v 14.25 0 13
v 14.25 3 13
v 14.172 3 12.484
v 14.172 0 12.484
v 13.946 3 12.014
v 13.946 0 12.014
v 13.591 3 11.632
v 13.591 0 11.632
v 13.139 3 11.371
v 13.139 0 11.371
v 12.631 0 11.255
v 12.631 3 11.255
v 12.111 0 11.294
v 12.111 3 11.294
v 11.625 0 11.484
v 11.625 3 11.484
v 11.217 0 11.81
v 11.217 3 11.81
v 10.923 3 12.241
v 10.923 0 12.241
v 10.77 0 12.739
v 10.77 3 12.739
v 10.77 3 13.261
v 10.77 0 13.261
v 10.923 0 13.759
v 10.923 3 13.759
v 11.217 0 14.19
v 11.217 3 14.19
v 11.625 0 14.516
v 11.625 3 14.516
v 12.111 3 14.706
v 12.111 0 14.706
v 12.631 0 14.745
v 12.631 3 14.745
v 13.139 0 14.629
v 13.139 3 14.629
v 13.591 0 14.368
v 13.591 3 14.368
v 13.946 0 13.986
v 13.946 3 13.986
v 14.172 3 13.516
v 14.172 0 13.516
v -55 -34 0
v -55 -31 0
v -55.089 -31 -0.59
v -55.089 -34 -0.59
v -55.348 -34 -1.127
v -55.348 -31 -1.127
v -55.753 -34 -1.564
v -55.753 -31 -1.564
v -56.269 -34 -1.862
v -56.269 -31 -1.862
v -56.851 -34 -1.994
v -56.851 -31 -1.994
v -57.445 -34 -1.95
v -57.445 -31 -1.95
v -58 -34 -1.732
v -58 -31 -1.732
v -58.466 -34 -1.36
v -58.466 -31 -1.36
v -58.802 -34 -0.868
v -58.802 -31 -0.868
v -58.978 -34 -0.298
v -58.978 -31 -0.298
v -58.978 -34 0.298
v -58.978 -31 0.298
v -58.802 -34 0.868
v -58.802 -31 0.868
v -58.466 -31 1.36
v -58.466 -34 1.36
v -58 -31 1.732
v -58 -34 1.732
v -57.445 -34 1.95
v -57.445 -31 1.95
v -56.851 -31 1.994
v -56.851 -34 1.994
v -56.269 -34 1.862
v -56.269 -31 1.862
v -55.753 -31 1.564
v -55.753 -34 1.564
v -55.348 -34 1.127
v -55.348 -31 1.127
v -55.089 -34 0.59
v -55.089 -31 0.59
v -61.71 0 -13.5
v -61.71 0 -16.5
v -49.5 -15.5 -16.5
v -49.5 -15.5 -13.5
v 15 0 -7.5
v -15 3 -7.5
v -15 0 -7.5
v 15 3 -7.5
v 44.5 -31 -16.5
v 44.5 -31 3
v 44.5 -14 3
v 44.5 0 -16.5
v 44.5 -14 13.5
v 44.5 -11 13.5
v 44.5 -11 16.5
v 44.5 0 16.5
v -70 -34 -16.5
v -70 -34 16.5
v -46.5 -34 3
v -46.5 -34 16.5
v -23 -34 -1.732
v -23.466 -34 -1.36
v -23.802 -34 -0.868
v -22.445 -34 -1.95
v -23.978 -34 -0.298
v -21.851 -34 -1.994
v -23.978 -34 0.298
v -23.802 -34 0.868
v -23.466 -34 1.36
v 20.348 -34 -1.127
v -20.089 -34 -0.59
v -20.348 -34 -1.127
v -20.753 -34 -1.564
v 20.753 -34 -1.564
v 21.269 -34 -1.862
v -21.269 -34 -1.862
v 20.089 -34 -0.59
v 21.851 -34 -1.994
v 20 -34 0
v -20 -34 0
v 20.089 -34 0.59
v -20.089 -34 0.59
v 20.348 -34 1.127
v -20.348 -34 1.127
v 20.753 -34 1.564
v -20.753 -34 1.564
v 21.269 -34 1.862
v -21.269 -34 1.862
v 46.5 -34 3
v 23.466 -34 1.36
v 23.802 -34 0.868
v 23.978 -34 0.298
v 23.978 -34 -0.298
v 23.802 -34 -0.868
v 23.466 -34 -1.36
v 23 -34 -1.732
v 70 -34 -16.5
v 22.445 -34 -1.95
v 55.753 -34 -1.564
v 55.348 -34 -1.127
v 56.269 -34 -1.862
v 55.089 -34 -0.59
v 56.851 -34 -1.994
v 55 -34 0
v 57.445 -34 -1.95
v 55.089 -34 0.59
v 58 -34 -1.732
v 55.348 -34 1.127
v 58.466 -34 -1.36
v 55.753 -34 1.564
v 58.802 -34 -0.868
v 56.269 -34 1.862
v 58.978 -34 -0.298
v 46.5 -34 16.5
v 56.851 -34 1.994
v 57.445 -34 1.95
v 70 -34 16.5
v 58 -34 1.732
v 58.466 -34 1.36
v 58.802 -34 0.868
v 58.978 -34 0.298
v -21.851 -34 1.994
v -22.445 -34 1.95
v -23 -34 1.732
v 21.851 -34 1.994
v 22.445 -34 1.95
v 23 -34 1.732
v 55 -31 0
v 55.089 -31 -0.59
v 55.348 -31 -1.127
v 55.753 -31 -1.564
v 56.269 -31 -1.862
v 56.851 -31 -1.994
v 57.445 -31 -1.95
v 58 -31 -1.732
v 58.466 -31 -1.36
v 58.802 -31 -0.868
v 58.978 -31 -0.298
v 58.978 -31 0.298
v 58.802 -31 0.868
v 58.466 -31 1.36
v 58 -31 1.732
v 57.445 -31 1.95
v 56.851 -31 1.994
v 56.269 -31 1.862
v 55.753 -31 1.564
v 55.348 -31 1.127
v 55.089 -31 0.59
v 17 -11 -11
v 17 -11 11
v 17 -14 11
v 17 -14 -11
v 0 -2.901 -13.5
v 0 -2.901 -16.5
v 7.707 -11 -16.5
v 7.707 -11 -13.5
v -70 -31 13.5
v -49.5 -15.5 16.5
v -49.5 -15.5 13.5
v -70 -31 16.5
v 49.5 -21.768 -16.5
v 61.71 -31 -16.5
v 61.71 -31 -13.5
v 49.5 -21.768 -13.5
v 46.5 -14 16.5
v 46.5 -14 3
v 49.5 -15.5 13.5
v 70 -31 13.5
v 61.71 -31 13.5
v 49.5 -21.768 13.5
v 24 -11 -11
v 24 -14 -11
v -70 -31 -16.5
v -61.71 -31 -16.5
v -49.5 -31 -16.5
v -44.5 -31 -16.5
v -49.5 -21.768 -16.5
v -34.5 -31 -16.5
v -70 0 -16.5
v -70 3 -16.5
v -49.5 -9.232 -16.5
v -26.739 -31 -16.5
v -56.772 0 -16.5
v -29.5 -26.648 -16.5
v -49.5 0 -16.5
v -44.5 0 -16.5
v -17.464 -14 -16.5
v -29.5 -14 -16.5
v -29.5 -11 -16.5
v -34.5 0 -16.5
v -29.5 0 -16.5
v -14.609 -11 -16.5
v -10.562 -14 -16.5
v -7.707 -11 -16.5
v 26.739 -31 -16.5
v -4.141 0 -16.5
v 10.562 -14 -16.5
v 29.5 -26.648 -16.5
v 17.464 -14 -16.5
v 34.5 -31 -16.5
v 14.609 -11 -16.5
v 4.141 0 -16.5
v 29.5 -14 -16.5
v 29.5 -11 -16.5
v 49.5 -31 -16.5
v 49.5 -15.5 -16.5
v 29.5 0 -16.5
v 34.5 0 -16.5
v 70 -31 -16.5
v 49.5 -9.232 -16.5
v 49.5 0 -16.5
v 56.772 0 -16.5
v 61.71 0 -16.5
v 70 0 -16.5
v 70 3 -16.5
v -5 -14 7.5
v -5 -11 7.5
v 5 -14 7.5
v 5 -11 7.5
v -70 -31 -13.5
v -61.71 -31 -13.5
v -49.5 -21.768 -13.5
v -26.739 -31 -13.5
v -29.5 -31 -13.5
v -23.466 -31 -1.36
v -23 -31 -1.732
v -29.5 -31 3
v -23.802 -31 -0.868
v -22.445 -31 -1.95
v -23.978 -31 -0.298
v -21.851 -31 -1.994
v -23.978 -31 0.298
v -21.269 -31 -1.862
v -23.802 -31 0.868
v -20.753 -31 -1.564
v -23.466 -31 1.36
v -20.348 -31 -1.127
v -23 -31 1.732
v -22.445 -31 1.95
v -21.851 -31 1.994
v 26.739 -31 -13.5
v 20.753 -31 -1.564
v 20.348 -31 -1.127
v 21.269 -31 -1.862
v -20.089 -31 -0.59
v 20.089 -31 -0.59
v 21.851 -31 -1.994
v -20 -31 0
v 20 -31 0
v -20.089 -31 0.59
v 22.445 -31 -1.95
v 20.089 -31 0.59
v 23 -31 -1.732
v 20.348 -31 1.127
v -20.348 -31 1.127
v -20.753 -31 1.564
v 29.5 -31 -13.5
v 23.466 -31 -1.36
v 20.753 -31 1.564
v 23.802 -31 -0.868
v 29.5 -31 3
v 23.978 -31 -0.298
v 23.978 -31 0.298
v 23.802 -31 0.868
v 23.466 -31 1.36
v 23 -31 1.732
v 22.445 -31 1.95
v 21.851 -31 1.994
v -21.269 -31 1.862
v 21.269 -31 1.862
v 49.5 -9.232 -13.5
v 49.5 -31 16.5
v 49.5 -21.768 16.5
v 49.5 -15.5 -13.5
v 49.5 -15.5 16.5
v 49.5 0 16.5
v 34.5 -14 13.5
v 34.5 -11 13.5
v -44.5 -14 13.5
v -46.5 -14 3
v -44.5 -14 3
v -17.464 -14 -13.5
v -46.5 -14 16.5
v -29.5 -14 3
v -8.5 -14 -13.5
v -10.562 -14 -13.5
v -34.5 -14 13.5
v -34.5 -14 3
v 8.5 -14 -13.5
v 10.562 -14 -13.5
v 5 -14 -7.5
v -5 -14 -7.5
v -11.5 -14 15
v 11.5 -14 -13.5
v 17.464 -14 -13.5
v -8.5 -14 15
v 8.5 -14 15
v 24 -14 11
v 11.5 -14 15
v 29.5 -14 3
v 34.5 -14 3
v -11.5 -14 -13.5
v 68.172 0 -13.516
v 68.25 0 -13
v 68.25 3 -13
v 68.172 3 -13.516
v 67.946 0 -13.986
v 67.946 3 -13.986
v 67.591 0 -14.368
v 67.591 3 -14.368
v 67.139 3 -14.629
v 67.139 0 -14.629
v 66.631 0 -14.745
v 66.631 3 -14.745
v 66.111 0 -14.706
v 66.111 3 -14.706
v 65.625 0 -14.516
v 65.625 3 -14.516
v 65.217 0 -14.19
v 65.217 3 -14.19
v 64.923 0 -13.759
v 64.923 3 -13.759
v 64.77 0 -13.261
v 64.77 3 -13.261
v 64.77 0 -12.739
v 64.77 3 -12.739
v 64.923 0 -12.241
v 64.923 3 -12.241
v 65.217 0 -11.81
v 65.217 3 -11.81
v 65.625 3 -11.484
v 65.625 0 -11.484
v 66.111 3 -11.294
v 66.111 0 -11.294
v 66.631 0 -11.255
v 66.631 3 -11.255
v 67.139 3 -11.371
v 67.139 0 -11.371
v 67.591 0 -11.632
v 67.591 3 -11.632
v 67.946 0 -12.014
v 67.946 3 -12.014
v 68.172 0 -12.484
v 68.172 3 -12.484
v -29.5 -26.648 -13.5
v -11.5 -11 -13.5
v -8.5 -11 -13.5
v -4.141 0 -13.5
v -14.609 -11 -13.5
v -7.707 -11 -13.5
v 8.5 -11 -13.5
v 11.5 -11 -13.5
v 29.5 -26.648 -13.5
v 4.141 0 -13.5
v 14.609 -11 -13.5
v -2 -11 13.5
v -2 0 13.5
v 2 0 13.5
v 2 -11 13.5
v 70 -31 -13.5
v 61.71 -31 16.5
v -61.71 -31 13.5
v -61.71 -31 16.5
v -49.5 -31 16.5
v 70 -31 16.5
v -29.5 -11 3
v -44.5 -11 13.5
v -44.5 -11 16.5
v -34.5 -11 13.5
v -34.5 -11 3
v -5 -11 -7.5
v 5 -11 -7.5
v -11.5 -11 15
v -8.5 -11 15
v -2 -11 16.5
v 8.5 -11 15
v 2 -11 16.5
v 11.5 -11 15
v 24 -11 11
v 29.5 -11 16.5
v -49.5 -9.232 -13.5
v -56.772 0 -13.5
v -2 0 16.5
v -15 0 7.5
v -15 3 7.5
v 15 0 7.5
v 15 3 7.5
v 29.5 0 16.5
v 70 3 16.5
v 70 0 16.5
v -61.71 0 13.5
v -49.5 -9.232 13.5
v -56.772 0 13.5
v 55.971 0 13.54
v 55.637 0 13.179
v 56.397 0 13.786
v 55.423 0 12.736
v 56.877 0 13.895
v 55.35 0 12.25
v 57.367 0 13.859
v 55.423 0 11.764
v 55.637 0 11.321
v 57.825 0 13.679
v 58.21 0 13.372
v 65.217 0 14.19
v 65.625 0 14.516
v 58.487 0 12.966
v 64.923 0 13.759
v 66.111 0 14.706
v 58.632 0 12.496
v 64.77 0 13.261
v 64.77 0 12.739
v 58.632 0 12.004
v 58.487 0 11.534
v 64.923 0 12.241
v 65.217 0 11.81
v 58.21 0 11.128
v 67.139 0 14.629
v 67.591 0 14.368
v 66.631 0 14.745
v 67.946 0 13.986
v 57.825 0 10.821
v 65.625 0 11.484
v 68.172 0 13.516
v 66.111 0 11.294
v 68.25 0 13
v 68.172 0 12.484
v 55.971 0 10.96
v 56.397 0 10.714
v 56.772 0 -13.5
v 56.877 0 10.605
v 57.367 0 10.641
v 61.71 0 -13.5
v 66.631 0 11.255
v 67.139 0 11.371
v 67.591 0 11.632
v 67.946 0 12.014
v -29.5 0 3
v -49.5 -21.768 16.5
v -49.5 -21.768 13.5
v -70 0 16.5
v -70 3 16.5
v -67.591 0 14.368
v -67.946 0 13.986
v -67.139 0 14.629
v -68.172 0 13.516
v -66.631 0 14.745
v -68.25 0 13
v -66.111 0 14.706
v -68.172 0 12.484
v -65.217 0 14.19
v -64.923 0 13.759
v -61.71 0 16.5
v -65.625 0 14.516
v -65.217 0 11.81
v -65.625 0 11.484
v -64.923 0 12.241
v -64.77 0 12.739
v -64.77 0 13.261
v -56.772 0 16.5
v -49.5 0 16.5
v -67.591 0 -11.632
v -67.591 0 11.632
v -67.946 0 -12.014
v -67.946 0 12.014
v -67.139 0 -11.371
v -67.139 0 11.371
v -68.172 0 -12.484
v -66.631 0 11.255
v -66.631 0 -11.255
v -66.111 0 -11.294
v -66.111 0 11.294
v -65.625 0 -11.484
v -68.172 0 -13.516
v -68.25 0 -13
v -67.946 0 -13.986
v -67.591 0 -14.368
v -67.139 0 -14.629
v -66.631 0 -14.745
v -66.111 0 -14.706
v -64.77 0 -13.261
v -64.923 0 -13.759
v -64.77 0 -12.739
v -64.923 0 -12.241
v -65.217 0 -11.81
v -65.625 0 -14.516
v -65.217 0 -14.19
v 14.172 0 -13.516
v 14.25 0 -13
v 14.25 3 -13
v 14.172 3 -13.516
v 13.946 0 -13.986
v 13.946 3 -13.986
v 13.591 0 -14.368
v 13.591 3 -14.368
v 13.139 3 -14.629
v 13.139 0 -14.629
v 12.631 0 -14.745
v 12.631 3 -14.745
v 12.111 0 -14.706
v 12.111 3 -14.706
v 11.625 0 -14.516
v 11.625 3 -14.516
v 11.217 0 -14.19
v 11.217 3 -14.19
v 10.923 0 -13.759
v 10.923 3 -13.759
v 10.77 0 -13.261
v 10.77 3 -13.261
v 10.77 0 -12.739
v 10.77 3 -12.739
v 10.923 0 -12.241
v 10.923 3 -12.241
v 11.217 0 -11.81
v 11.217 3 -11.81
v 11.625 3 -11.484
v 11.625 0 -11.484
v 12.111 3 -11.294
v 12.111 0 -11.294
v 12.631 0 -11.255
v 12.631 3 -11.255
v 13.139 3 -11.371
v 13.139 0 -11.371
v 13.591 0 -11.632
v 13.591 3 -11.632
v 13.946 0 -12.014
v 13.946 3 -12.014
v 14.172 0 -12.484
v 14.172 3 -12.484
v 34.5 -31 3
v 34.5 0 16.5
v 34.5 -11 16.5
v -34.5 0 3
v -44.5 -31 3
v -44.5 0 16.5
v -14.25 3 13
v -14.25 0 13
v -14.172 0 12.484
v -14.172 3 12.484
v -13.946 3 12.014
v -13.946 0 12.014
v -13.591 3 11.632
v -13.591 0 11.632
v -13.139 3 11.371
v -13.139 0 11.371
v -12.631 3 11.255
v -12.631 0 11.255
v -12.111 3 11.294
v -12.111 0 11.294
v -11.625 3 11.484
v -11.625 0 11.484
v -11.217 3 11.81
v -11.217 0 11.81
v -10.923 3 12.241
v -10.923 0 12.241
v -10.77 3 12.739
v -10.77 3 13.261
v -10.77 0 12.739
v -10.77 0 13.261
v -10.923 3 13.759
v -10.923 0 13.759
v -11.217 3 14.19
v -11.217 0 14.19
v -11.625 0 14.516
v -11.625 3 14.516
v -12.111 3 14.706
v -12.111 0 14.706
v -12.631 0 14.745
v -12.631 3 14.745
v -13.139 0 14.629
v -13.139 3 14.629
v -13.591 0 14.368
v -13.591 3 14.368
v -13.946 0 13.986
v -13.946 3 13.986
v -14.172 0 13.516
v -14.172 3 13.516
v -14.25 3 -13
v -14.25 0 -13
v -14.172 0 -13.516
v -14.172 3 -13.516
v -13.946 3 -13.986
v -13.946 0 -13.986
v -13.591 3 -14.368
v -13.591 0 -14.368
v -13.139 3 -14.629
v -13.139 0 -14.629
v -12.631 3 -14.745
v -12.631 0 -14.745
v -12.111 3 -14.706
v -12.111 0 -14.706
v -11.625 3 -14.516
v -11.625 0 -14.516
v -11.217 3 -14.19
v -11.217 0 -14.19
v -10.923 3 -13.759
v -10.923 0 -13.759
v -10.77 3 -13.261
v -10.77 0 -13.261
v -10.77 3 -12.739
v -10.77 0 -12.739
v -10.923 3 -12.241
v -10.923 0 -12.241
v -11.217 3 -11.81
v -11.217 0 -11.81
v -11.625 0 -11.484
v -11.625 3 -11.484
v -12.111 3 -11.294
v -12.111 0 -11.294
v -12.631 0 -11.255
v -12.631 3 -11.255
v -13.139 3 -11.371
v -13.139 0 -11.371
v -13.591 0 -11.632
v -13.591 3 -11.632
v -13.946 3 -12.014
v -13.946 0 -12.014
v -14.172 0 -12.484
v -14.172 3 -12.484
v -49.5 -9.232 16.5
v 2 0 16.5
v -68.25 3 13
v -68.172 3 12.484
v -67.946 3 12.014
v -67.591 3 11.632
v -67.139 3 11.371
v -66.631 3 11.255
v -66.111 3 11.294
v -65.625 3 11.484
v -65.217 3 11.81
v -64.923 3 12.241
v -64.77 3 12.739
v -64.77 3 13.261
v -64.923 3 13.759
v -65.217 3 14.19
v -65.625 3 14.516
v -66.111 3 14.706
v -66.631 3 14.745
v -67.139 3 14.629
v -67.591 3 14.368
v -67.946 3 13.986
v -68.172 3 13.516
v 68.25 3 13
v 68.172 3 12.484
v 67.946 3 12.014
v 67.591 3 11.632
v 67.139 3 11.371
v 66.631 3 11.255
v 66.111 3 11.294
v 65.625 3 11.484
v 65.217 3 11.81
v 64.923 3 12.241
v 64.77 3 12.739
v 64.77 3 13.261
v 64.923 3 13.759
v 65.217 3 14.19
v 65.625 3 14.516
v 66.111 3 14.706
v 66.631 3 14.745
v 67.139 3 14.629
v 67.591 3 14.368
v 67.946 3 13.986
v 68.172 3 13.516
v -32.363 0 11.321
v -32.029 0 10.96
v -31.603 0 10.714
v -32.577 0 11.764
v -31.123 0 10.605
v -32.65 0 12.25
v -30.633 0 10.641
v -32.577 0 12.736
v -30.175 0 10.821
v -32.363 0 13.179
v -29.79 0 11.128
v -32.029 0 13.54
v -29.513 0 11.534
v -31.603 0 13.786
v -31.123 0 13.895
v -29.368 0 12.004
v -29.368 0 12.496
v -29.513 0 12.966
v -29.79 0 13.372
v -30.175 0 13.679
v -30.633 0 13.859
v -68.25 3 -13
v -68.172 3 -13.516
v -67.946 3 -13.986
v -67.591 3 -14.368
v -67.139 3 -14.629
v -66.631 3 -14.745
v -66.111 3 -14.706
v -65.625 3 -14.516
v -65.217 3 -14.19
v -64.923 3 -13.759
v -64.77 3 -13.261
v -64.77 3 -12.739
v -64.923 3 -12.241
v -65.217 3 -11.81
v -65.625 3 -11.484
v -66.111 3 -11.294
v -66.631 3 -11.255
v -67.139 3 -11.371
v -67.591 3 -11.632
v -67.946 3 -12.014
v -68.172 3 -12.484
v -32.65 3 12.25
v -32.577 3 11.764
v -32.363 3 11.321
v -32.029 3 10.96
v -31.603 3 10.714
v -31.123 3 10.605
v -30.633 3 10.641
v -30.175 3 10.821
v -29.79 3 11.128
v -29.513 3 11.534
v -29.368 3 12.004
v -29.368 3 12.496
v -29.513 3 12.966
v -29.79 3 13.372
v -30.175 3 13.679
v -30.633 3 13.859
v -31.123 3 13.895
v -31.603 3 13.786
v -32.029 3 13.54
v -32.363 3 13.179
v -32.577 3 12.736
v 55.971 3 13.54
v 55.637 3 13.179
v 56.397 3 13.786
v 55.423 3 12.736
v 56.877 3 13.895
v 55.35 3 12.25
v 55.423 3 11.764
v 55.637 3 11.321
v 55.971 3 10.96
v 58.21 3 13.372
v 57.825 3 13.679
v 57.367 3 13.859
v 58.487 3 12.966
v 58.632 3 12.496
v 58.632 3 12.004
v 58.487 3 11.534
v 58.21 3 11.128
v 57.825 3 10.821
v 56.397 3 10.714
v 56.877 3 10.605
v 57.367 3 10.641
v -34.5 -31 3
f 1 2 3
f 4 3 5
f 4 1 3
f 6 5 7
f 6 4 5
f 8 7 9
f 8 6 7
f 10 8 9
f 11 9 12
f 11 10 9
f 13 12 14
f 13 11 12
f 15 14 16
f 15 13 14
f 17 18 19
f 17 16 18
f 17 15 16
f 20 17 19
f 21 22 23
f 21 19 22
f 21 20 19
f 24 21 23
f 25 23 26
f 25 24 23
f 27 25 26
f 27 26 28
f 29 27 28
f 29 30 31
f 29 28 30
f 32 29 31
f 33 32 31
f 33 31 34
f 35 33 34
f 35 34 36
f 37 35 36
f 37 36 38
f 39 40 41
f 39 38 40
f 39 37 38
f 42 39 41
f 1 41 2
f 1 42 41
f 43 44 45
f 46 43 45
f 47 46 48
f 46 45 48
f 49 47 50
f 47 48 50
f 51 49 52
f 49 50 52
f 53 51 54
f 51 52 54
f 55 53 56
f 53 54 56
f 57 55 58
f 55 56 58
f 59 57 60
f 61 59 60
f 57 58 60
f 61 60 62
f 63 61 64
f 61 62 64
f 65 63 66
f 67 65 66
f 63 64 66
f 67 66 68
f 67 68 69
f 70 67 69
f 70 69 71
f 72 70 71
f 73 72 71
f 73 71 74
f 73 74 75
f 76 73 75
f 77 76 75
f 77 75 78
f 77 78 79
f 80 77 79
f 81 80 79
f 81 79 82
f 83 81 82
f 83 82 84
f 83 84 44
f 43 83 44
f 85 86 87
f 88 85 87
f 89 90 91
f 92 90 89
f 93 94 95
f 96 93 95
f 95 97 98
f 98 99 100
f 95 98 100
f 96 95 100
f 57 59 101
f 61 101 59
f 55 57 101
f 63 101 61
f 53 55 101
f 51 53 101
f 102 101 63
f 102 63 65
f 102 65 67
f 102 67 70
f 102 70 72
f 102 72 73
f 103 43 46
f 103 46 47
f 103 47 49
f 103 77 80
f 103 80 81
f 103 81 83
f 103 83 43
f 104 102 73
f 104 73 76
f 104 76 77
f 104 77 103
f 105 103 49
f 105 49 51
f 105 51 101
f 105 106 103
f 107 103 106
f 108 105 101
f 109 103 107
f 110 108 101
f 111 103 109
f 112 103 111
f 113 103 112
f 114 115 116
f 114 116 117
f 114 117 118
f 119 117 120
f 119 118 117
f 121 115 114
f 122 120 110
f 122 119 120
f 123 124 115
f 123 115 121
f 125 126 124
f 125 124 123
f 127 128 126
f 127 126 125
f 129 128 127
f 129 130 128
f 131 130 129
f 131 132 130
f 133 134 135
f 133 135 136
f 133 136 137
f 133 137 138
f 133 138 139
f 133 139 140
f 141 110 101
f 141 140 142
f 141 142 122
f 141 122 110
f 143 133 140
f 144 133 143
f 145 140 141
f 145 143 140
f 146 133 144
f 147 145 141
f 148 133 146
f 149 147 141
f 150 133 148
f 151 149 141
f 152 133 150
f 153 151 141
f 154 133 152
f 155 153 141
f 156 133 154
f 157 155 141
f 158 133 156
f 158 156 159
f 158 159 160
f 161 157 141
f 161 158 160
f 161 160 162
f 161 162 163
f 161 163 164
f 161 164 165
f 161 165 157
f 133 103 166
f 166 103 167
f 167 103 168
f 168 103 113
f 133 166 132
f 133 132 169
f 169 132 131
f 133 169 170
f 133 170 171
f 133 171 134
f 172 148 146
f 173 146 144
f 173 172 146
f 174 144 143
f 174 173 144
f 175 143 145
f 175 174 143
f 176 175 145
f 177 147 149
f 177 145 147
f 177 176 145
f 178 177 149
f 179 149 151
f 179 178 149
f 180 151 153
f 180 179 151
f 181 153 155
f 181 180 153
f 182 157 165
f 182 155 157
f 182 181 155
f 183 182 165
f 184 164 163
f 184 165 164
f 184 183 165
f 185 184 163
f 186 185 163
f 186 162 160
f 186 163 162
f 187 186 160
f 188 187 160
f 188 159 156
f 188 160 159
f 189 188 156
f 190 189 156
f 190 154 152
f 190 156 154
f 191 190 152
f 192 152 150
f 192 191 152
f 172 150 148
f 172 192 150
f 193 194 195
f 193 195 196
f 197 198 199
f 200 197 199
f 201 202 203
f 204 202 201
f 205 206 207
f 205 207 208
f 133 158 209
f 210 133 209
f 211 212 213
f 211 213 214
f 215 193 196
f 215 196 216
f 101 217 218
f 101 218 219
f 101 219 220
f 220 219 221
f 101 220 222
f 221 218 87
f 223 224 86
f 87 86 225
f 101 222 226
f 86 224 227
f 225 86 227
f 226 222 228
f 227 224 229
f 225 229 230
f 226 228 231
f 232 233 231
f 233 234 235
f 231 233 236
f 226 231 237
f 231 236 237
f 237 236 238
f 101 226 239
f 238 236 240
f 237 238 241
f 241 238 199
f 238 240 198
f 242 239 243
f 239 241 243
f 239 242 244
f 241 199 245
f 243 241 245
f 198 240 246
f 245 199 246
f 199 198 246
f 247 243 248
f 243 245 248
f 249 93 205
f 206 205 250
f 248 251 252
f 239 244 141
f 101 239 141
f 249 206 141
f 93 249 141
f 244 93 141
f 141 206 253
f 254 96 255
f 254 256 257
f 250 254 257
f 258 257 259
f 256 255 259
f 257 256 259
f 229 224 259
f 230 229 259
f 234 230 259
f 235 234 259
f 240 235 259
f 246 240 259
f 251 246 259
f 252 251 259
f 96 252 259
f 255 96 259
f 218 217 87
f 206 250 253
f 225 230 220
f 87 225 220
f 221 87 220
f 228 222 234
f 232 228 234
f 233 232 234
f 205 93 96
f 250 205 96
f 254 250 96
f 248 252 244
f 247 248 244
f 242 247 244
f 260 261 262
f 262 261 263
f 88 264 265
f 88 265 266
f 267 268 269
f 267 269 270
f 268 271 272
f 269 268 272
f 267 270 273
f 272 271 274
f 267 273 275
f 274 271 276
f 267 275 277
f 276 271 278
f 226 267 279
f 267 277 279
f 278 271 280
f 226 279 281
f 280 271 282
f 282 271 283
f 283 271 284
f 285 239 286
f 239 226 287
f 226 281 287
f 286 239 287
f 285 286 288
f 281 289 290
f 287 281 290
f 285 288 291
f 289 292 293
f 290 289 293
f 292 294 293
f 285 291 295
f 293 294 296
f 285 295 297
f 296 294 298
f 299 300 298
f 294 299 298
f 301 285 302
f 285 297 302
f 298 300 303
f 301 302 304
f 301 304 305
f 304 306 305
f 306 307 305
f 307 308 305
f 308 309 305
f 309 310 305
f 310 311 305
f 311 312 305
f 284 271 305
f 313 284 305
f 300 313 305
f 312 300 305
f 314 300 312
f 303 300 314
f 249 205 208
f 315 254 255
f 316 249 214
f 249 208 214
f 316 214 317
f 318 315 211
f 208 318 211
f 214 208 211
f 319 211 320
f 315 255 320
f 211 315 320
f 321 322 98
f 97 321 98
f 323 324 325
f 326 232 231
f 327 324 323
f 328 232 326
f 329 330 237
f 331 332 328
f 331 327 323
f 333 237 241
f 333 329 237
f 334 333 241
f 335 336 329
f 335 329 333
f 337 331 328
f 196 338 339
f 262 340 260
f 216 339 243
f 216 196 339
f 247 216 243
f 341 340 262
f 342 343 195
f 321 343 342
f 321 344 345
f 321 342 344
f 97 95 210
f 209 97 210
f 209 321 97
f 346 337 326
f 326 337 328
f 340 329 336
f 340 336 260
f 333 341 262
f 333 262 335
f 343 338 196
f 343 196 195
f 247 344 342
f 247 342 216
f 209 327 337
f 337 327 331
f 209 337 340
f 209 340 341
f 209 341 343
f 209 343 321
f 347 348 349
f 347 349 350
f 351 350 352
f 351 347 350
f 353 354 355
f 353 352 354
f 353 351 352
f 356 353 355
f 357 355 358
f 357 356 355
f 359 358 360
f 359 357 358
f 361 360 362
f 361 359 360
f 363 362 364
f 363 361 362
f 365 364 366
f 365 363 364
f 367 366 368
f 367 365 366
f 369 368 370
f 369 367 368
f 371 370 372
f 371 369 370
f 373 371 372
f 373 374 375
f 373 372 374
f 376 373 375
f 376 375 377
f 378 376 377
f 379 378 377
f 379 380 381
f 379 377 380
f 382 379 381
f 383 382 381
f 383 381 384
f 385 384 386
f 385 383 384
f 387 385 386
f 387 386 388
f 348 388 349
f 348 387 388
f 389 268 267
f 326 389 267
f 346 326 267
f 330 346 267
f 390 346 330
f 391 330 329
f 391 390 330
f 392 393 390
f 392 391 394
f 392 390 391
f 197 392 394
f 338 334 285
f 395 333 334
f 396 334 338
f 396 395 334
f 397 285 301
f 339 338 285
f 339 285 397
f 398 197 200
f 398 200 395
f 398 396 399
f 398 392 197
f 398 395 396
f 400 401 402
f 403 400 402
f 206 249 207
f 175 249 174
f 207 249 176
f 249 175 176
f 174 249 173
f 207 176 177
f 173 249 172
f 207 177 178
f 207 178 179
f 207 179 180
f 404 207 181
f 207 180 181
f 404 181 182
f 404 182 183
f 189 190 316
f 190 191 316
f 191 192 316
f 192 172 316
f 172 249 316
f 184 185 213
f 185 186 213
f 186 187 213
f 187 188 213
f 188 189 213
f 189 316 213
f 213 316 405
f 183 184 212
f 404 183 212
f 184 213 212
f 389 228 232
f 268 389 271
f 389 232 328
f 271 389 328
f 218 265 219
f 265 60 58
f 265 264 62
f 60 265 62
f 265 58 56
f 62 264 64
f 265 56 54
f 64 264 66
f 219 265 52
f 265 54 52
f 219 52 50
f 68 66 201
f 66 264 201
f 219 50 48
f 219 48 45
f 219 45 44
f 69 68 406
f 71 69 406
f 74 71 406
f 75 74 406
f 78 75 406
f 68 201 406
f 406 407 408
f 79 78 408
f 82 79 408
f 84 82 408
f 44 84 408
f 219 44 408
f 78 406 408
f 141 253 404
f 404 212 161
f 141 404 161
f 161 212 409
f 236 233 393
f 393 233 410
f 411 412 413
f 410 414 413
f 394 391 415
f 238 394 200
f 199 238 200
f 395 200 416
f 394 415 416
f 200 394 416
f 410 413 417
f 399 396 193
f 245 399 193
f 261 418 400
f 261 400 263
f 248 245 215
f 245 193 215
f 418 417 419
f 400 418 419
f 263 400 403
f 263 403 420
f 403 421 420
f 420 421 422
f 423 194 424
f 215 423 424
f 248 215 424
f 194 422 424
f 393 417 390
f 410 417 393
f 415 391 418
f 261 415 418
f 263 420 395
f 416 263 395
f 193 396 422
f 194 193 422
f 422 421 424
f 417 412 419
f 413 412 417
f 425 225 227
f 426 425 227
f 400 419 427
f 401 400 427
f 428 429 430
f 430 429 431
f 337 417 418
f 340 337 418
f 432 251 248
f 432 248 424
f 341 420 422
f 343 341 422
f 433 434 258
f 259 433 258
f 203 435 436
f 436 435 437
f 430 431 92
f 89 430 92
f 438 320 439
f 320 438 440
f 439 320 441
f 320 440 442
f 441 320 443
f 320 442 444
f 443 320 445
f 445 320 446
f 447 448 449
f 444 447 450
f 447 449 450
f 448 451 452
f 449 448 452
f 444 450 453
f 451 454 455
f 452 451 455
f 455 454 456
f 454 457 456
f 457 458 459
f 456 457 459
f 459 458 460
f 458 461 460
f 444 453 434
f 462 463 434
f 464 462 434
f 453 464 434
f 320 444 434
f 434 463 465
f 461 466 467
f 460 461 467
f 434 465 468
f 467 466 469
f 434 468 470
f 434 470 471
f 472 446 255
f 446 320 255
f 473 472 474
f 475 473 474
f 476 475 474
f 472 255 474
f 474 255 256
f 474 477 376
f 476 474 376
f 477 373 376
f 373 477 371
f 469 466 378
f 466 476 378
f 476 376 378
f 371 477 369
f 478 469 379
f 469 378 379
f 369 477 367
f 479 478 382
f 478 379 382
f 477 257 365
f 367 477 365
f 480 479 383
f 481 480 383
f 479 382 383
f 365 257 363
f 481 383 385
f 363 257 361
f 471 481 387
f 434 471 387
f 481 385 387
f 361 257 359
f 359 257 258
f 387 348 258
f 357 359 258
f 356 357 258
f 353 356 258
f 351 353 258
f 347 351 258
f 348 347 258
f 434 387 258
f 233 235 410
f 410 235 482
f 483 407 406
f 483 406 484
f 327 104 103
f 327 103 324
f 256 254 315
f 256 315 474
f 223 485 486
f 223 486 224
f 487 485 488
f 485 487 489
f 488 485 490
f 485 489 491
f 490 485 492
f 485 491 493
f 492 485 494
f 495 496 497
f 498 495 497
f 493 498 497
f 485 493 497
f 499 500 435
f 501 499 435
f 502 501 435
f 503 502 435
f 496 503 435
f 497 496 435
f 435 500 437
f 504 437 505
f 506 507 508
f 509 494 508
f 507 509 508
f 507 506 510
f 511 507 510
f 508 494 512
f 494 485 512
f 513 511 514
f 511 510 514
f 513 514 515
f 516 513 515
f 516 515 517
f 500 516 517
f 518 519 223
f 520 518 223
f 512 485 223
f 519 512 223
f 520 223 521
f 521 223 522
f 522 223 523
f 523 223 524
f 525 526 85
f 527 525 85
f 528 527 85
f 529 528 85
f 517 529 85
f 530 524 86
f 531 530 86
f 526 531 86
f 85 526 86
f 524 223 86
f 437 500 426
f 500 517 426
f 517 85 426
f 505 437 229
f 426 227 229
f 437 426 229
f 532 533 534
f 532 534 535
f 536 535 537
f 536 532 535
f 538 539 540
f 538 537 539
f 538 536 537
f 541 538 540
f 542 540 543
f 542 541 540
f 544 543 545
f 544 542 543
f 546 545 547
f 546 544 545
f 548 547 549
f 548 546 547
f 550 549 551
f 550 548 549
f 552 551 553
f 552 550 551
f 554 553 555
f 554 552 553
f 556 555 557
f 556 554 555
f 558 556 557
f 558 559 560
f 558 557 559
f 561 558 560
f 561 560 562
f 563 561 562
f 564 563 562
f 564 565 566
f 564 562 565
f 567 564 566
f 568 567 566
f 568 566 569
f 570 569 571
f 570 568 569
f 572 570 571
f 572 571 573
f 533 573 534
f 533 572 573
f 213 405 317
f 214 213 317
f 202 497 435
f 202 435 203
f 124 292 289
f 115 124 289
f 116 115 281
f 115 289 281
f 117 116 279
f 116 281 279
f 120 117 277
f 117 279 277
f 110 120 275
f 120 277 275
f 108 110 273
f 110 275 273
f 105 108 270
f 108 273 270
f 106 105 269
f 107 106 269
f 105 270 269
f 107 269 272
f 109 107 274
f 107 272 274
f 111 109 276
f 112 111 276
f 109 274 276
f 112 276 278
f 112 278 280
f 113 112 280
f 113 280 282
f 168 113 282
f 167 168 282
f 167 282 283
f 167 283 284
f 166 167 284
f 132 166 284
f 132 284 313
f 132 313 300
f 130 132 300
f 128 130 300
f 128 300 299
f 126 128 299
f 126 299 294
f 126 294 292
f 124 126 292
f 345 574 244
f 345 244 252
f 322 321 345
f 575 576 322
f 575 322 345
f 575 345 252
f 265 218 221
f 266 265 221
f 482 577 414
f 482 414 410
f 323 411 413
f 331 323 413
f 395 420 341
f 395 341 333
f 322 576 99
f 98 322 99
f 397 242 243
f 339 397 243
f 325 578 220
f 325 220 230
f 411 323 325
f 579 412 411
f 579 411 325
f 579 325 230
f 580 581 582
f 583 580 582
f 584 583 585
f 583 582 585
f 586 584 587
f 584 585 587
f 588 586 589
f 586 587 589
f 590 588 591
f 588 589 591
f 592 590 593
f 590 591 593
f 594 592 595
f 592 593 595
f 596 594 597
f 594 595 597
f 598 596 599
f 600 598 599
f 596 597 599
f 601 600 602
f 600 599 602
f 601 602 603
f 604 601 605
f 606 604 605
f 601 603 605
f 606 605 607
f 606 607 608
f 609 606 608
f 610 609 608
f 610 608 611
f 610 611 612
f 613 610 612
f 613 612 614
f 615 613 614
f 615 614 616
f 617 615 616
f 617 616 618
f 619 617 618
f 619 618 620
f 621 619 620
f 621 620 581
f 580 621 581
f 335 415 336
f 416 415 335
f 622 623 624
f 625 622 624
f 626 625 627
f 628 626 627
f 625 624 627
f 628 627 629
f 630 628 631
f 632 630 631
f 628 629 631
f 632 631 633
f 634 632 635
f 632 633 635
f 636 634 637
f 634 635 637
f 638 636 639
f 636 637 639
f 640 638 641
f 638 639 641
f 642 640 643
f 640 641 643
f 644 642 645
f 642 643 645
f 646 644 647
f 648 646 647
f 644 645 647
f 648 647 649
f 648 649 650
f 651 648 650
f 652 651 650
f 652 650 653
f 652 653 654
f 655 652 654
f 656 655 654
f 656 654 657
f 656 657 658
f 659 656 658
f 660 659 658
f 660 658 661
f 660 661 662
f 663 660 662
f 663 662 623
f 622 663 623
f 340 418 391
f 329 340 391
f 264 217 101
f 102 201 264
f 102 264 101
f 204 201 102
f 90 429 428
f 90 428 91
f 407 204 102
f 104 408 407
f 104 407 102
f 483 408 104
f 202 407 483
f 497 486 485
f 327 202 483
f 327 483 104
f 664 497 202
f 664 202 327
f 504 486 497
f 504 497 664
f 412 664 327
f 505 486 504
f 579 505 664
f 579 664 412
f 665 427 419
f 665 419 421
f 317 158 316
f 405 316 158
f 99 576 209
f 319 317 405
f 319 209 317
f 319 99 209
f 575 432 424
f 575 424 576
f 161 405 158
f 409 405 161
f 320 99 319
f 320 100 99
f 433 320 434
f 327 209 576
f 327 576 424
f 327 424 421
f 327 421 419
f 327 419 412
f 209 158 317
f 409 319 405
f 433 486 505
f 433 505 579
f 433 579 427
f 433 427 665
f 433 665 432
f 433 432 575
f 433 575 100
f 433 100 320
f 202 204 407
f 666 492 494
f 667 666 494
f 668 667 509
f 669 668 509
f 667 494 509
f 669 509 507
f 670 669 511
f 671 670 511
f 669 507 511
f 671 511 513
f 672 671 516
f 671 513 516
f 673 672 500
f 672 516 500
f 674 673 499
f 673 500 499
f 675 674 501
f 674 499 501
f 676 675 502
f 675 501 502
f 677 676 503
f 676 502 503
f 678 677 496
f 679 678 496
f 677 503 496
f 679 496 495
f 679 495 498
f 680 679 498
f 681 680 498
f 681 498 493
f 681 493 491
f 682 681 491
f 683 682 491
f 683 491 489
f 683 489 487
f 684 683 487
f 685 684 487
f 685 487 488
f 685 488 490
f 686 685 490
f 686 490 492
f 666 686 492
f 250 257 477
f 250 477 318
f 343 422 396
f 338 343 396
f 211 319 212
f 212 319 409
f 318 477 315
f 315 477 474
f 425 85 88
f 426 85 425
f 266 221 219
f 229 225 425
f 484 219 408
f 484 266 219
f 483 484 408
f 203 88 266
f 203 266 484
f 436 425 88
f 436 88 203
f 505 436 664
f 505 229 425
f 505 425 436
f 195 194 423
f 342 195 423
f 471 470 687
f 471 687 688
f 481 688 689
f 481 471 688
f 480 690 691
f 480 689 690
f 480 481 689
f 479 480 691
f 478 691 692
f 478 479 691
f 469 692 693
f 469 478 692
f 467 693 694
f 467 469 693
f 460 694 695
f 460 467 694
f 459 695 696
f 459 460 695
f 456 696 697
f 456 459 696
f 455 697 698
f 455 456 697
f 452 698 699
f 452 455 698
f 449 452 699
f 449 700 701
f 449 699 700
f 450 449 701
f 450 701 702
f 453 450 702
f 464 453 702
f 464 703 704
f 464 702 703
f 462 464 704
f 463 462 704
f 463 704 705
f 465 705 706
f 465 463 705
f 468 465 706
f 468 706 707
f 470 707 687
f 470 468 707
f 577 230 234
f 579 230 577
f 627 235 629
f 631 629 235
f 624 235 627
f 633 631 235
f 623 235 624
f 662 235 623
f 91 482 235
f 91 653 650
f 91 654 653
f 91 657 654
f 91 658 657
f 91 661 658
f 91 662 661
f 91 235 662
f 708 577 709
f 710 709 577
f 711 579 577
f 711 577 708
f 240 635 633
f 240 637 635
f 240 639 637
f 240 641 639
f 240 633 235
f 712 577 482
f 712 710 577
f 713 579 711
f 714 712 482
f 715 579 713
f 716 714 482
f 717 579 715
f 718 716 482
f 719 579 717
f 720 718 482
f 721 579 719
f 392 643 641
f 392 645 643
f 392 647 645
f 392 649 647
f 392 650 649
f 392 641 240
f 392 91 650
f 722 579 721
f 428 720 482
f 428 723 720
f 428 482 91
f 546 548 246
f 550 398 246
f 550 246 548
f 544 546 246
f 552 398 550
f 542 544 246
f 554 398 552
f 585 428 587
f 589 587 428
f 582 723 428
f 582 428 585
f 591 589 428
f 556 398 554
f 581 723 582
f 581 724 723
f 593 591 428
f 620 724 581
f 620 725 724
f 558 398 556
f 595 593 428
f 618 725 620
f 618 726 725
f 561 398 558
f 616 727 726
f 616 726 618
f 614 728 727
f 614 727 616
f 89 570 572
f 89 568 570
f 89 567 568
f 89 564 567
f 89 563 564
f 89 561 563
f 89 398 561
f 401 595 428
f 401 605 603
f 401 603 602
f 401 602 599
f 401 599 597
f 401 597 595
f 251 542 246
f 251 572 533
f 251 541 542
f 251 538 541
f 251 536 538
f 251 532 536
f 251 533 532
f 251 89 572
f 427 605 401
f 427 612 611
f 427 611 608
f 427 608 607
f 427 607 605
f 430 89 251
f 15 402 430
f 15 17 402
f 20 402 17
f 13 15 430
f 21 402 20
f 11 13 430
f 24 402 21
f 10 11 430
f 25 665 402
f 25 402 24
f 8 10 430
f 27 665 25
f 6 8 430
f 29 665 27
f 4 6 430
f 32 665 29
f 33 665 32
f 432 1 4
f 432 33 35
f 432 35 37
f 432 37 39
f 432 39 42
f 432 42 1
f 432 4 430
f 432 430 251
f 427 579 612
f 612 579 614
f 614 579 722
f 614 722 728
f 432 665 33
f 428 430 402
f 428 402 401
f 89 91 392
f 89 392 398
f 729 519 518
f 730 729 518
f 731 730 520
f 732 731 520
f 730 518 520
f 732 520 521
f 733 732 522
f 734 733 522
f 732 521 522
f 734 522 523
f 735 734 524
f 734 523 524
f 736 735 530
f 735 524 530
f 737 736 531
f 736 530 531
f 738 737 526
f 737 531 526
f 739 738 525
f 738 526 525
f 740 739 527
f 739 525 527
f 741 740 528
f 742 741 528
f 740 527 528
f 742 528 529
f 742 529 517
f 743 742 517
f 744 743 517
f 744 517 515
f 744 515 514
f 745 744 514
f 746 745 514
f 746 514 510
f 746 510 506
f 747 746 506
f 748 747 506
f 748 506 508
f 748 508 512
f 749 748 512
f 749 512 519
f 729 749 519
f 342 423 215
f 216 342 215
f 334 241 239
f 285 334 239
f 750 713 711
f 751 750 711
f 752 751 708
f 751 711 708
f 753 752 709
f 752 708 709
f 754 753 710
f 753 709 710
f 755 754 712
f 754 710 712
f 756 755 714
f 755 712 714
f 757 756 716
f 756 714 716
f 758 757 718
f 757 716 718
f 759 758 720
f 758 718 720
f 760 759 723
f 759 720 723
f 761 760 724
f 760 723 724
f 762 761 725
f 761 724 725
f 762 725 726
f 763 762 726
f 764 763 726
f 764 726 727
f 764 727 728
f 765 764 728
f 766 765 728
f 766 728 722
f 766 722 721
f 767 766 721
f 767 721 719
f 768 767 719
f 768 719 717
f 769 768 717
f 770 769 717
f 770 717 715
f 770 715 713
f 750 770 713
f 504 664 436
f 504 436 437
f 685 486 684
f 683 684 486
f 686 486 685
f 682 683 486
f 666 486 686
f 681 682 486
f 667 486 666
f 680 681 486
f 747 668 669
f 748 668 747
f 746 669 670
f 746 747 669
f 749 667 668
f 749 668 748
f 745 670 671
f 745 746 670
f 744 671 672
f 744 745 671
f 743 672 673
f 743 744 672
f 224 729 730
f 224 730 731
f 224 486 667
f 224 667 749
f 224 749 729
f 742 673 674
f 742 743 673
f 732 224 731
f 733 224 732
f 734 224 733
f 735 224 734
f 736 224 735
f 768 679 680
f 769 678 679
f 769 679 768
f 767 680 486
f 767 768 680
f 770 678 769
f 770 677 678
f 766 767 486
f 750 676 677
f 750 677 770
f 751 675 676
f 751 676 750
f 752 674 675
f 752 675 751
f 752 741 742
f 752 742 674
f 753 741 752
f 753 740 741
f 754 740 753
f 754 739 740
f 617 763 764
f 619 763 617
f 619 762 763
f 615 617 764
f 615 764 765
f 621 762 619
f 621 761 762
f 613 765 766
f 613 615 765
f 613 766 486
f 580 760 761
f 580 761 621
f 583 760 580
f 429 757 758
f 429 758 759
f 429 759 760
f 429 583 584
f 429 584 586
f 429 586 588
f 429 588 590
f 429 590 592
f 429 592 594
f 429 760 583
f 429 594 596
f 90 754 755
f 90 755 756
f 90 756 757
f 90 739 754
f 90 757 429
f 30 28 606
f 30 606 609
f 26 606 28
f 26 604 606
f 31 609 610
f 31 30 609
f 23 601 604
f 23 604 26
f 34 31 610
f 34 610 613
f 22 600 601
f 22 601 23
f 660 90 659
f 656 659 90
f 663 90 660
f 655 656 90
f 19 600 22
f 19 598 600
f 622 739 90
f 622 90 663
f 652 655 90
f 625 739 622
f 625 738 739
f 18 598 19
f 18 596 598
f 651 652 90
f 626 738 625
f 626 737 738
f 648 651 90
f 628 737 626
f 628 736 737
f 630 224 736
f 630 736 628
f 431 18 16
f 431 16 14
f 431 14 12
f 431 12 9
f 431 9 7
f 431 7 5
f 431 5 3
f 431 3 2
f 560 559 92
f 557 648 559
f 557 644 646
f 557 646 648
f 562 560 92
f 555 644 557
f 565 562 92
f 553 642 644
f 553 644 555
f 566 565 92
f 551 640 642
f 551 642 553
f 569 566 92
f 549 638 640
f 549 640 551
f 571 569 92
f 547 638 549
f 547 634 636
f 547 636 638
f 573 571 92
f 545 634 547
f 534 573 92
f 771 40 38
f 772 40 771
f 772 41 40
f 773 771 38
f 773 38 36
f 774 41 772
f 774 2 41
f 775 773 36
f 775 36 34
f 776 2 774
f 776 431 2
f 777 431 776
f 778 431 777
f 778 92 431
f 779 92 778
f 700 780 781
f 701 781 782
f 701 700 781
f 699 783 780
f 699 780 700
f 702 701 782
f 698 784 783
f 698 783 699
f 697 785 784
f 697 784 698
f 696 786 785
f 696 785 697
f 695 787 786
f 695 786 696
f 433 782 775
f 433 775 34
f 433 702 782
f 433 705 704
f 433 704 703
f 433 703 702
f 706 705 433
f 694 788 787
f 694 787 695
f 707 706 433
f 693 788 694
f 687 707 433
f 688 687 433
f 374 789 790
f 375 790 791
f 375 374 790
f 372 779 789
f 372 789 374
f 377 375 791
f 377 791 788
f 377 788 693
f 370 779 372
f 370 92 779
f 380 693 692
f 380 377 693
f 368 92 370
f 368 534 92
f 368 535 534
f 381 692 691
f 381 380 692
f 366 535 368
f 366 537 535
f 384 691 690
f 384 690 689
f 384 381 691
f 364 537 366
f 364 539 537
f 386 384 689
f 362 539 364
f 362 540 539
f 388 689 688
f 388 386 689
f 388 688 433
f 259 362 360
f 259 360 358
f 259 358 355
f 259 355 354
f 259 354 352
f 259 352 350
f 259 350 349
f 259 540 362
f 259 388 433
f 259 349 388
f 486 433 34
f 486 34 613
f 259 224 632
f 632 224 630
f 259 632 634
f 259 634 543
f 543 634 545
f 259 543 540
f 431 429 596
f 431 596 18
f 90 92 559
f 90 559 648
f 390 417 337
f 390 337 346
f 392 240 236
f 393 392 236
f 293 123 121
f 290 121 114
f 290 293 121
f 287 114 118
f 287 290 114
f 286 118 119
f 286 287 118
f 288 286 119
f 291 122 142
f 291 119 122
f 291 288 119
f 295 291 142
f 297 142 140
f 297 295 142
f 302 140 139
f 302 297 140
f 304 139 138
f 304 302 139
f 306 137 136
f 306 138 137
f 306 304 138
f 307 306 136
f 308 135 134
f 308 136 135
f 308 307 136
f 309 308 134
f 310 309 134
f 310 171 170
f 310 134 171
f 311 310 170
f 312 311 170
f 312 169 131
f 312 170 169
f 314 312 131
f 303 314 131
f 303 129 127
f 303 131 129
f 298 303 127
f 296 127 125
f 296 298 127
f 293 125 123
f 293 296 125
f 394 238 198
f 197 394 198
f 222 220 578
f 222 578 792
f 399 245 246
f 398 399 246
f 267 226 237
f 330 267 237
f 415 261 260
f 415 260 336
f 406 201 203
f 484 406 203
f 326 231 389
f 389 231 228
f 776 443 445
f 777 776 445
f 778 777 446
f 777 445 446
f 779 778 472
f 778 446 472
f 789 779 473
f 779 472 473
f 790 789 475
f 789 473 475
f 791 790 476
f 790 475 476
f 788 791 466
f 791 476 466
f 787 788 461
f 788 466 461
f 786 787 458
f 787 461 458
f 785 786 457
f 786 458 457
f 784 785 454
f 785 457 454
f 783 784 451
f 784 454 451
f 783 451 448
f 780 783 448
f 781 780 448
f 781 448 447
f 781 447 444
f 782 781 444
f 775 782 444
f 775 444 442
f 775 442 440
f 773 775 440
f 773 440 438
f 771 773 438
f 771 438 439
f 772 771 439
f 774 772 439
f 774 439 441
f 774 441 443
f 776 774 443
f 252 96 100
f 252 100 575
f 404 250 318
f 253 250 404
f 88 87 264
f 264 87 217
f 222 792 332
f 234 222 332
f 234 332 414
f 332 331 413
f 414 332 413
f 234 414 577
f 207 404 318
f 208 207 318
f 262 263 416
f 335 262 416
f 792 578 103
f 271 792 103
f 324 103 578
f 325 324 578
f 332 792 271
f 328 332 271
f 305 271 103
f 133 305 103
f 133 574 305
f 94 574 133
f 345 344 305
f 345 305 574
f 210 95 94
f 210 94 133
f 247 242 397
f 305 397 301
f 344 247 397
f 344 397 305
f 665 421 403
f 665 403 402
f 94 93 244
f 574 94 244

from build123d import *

# Parameters (mm, degrees)
SKETCH_1_W            = 140
SKETCH_1_H            = 33
EXTRUDE_1_DEPTH       = 3
HOLE_WIZARD_1_D       = 3.5
SKETCH_5_W            = 10
SKETCH_5_H            = 33
EXTRUDE_2_DEPTH       = 31
SKETCH_6_W            = 140
SKETCH_6_H            = 33
EXTRUDE_3_DEPTH       = 3
HOLE_WIZARD_2_D       = 4
HOLE_WIZARD_2_DEPTH   = 3
EXTRUDE_7_DEPTH       = 3
MIRROR_4_COPY_1_DEPTH = 3
EXTRUDE_8_DEPTH       = 3
SKETCH_12_W           = 10
SKETCH_12_H           = 31
CUT_EXTRUDE_1_DEPTH   = 85.528101836
SKETCH_14_W           = 18
SKETCH_14_H           = 3.3
CUT_EXTRUDE_3_DEPTH   = 3
SKETCH_17_W           = 30
SKETCH_17_H           = 15
CUT_EXTRUDE_5_DEPTH   = 5
SKETCH_22_W           = 15
SKETCH_22_H           = 15.5
CUT_EXTRUDE_6_DEPTH   = 3
SKETCH_23_W           = 93
SKETCH_23_H           = 20
CUT_EXTRUDE_7_DEPTH   = 13.5
SKETCH_24_W           = 59
SKETCH_24_H           = 14
CUT_EXTRUDE_8_DEPTH   = 3
SKETCH_26_W           = 59
SKETCH_26_H           = 3
EXTRUDE_9_DEPTH       = 33
SKETCH_27_W           = 1.5
SKETCH_27_H           = 28.5
CUT_EXTRUDE_9_DEPTH   = 3
SKETCH_28_W           = 10
SKETCH_28_H           = 3
EXTRUDE_10_DEPTH      = 3
SKETCH_29_W           = 10
SKETCH_29_H           = 15
CUT_EXTRUDE_10_DEPTH  = 3
SKETCH_30_W           = 4
SKETCH_30_H           = 11
EXTRUDE_11_DEPTH      = 3
CUT_EXTRUDE_11_REACH  = 77.507
SKETCH_31_W           = 7
SKETCH_31_H           = 11
SKETCH_35_W           = 5
SKETCH_35_H           = 11
CUT_EXTRUDE_12_DEPTH  = 13.5
HOLE_WIZARD_3_D       = 3.3
HOLE_WIZARD_3_DEPTH   = 3


with BuildPart() as part:
    # 草图1 → 凸台-拉伸1 (new body)
    with BuildSketch(Plane(origin=(0, 0, 0), x_dir=(1, 0, 0), z_dir=(0, 1, 0))):
        Rectangle(SKETCH_1_W, SKETCH_1_H)
    extrude(amount=EXTRUDE_1_DEPTH)

    # 孔1 (through all)
    with Locations(Plane(origin=(0, 3, 0), x_dir=(1, 0, 0), z_dir=(0, 1, 0))):
        with Locations((-66.5, 13), (-12.5, 13), (-12.5, -13), (-66.5, -13)):
            hole_wizard_1 = Hole(HOLE_WIZARD_1_D / 2)

    # 镜向1: 孔1 across plane
    add(hole_wizard_1.mirror(Plane.ZY), mode=Mode.SUBTRACT)

    # 草图5 → 凸台-拉伸2 (add)
    with BuildSketch(Plane.XZ):
        with Locations((-44.5, 0)):
            Rectangle(SKETCH_5_W, SKETCH_5_H)
        with Locations((-34.5, 0)):
            Rectangle(SKETCH_5_W, SKETCH_5_H)
        with Locations((34.5, 0)):
            Rectangle(SKETCH_5_W, SKETCH_5_H)
        with Locations((44.5, 0)):
            Rectangle(SKETCH_5_W, SKETCH_5_H)
    extrude(amount=EXTRUDE_2_DEPTH)

    # 草图6 → 凸台-拉伸3 (add)
    with BuildSketch(Plane.XZ.offset(31)):
        Rectangle(SKETCH_6_W, SKETCH_6_H)
    extrude(amount=EXTRUDE_3_DEPTH)

    # 孔2
    with Locations(Plane(origin=(0, -34, 0), x_dir=(-1, 0, 0), z_dir=(0, -1, 0))):
        with Locations((57, 0), (22, 0)):
            hole_wizard_2 = Hole(HOLE_WIZARD_2_D / 2, depth=HOLE_WIZARD_2_DEPTH)

    # 镜向2: 孔2 across plane
    add(hole_wizard_2.mirror(Plane.ZY), mode=Mode.SUBTRACT)

    # 草图10 → 凸台-拉伸7 (add)
    with BuildSketch(Plane.XY.offset(16.5)):
        Polygon((-61.709614661, 0), (-49.5, -15.5), (-49.5, -9.231659865), align=None)
        Polygon((-61.709614661, 0), (-49.5, -9.231659865), (-56.771936106, 0), align=None)
        Polygon((-49.5, -15.5), (-70, -31), (-61.709614661, -31), (-49.5, -21.768340135), align=None)
    extrude_7 = extrude(amount=-EXTRUDE_7_DEPTH)

    # 镜向3: 凸台-拉伸7 across plane
    add(extrude_7.mirror(Plane.XY))

    # 镜向4: 凸台-拉伸7 across plane
    add(extrude_7.mirror(Plane.ZY))

    # 镜向4 copy 1 sketch → 镜向4 copy 1 (add)
    with BuildSketch(Plane(origin=(0, 0, -16.5), x_dir=(-1, 0, 0), z_dir=(0, 0, -1))):
        Polygon((-61.709614661, 0), (-49.5, -15.5), (-49.5, -9.231659865), align=None)
        Polygon((-61.709614661, 0), (-49.5, -9.231659865), (-56.771936106, 0), align=None)
        Polygon((-49.5, -15.5), (-70, -31), (-61.709614661, -31), (-49.5, -21.768340135), align=None)
    extrude(amount=-MIRROR_4_COPY_1_DEPTH)

    # 草图11 → 凸台-拉伸8 (add)
    with BuildSketch(Plane.XY.offset(16.5)):
        Polygon((-1.380422804, -1.450613794), (-29.5, -31), (-26.739154392, -31), (0, -2.901227588), align=None)
        Polygon((-29.5, -26.648158618), (-29.5, -31), (-1.380422804, -1.450613794), (0, 0), (-4.141268412, 0), align=None)
        Polygon((0, 0), (-1.380422804, -1.450613794), (0, -2.901227588), (1.380422804, -1.450613794), align=None)
        Polygon((1.380422804, -1.450613794), (0, -2.901227588), (26.739154392, -31), (29.5, -31), align=None)
        Polygon((4.141268412, 0), (0, 0), (1.380422804, -1.450613794), (29.5, -31), (29.5, -26.648158618), align=None)
    extrude_8 = extrude(amount=-EXTRUDE_8_DEPTH)

    # 镜向5: 凸台-拉伸8 across plane
    add(extrude_8.mirror(Plane.XY))

    # 草图12 → 切除-拉伸1 (cut, through all)
    with BuildSketch(Plane.XY.offset(16.5)):
        with Locations((-39.5, -15.5)):
            Rectangle(SKETCH_12_W, SKETCH_12_H)
    cut_extrude_1 = extrude(amount=-CUT_EXTRUDE_1_DEPTH, mode=Mode.SUBTRACT)

    # 镜向6: 切除-拉伸1 across plane
    add(cut_extrude_1.mirror(Plane.ZY), mode=Mode.SUBTRACT)

    # 草图14 → 切除-拉伸3 (cut)
    with BuildSketch(Plane(origin=(0, -31, 0), x_dir=(1, 0, 0), z_dir=(0, 1, 0))):
        with Locations((0, -9.5)):
            Rectangle(SKETCH_14_W, SKETCH_14_H)
    extrude(amount=-CUT_EXTRUDE_3_DEPTH, mode=Mode.SUBTRACT)

    # 草图17 → 切除-拉伸5 (cut)
    with BuildSketch(Plane(origin=(0, 3, 0), x_dir=(1, 0, 0), z_dir=(0, 1, 0))):
        Rectangle(SKETCH_17_W, SKETCH_17_H)
    extrude(amount=-CUT_EXTRUDE_5_DEPTH, mode=Mode.SUBTRACT)

    # 草图22 → 切除-拉伸6 (cut)
    with BuildSketch(Plane.XY.offset(16.5)):
        with Locations((57, -7.75)):
            Rectangle(SKETCH_22_W, SKETCH_22_H)
    extrude(amount=-CUT_EXTRUDE_6_DEPTH, mode=Mode.SUBTRACT)

    # 草图23 → 切除-拉伸7 (cut)
    with BuildSketch(Plane.XY.offset(16.5)):
        with Locations((0, -24)):
            Rectangle(SKETCH_23_W, SKETCH_23_H)
    extrude(amount=-CUT_EXTRUDE_7_DEPTH, mode=Mode.SUBTRACT)

    # 草图24 → 切除-拉伸8 (cut)
    with BuildSketch(Plane.XY.offset(16.5)):
        with Locations((0, -7)):
            Rectangle(SKETCH_24_W, SKETCH_24_H)
    extrude(amount=-CUT_EXTRUDE_8_DEPTH, mode=Mode.SUBTRACT)

    # 草图26 → 凸台-拉伸9 (add)
    with BuildSketch(Plane.XY.offset(16.5)):
        with Locations((0, -12.5)):
            Rectangle(SKETCH_26_W, SKETCH_26_H)
    extrude(amount=-EXTRUDE_9_DEPTH)

    # 草图27 → 切除-拉伸9 (cut)
    with BuildSketch(Plane(origin=(0, -11, 0), x_dir=(1, 0, 0), z_dir=(0, 1, 0))):
        with Locations((-10.75, -0.75)):
            Rectangle(SKETCH_27_W, SKETCH_27_H)
        with Locations((-9.25, -0.75)):
            Rectangle(SKETCH_27_W, SKETCH_27_H)
        with Locations((9.25, -0.75)):
            Rectangle(SKETCH_27_W, SKETCH_27_H)
        with Locations((10.75, -0.75)):
            Rectangle(SKETCH_27_W, SKETCH_27_H)
    extrude(amount=-CUT_EXTRUDE_9_DEPTH, mode=Mode.SUBTRACT)

    # 草图28 → 凸台-拉伸10 (add)
    with BuildSketch(Plane.XY.offset(16.5)):
        with Locations((-39.5, -12.5)):
            Rectangle(SKETCH_28_W, SKETCH_28_H)
        with Locations((39.5, -12.5)):
            Rectangle(SKETCH_28_W, SKETCH_28_H)
    extrude(amount=-EXTRUDE_10_DEPTH)

    # 草图29 → 切除-拉伸10 (cut)
    with BuildSketch(Plane(origin=(0, -11, 0), x_dir=(1, 0, 0), z_dir=(0, 1, 0))):
        Rectangle(SKETCH_29_W, SKETCH_29_H)
    extrude(amount=-CUT_EXTRUDE_10_DEPTH, mode=Mode.SUBTRACT)

    # 草图30 → 凸台-拉伸11 (add)
    with BuildSketch(Plane.XY.offset(16.5)):
        with Locations((0, -5.5)):
            Rectangle(SKETCH_30_W, SKETCH_30_H)
    extrude(amount=-EXTRUDE_11_DEPTH)

    # 草图31 → 切除-拉伸11 (cut, up to next)
    with BuildSketch(Plane(origin=(0, -11, 0), x_dir=(1, 0, 0), z_dir=(0, 1, 0)), mode=Mode.PRIVATE) as cut_extrude_11_sk1:
        with Locations((20.5, -5.5)):
            Rectangle(SKETCH_31_W, SKETCH_31_H)
    cut_extrude_11_tool1 = extrude(cut_extrude_11_sk1.sketch, amount=-CUT_EXTRUDE_11_REACH, mode=Mode.PRIVATE) & part.part
    # 草图31 → 切除-拉伸11 (cut, up to next)
    with BuildSketch(Plane(origin=(0, -11, 0), x_dir=(1, 0, 0), z_dir=(0, 1, 0)), mode=Mode.PRIVATE) as cut_extrude_11_sk2:
        with Locations((20.5, 5.5)):
            Rectangle(SKETCH_31_W, SKETCH_31_H)
    cut_extrude_11_tool2 = extrude(cut_extrude_11_sk2.sketch, amount=-CUT_EXTRUDE_11_REACH, mode=Mode.PRIVATE) & part.part
    add(cut_extrude_11_tool1.solids().sort_by_distance((20.5, -11, 5.5))[0], mode=Mode.SUBTRACT)
    add(cut_extrude_11_tool2.solids().sort_by_distance((20.5, -11, -5.5))[0], mode=Mode.SUBTRACT)

    # 草图35 → 切除-拉伸12 (cut)
    with BuildSketch(Plane.XY.offset(16.5)):
        with Locations((-32, -5.5)):
            Rectangle(SKETCH_35_W, SKETCH_35_H)
    extrude(amount=-CUT_EXTRUDE_12_DEPTH, mode=Mode.SUBTRACT)

    # 孔3
    with Locations(Plane(origin=(0, 3, 0), x_dir=(1, 0, 0), z_dir=(0, 1, 0))):
        with Locations((57, -12.25), (-31, -12.25)):
            Hole(HOLE_WIZARD_3_D / 2, depth=HOLE_WIZARD_3_DEPTH)


solid = part.part
